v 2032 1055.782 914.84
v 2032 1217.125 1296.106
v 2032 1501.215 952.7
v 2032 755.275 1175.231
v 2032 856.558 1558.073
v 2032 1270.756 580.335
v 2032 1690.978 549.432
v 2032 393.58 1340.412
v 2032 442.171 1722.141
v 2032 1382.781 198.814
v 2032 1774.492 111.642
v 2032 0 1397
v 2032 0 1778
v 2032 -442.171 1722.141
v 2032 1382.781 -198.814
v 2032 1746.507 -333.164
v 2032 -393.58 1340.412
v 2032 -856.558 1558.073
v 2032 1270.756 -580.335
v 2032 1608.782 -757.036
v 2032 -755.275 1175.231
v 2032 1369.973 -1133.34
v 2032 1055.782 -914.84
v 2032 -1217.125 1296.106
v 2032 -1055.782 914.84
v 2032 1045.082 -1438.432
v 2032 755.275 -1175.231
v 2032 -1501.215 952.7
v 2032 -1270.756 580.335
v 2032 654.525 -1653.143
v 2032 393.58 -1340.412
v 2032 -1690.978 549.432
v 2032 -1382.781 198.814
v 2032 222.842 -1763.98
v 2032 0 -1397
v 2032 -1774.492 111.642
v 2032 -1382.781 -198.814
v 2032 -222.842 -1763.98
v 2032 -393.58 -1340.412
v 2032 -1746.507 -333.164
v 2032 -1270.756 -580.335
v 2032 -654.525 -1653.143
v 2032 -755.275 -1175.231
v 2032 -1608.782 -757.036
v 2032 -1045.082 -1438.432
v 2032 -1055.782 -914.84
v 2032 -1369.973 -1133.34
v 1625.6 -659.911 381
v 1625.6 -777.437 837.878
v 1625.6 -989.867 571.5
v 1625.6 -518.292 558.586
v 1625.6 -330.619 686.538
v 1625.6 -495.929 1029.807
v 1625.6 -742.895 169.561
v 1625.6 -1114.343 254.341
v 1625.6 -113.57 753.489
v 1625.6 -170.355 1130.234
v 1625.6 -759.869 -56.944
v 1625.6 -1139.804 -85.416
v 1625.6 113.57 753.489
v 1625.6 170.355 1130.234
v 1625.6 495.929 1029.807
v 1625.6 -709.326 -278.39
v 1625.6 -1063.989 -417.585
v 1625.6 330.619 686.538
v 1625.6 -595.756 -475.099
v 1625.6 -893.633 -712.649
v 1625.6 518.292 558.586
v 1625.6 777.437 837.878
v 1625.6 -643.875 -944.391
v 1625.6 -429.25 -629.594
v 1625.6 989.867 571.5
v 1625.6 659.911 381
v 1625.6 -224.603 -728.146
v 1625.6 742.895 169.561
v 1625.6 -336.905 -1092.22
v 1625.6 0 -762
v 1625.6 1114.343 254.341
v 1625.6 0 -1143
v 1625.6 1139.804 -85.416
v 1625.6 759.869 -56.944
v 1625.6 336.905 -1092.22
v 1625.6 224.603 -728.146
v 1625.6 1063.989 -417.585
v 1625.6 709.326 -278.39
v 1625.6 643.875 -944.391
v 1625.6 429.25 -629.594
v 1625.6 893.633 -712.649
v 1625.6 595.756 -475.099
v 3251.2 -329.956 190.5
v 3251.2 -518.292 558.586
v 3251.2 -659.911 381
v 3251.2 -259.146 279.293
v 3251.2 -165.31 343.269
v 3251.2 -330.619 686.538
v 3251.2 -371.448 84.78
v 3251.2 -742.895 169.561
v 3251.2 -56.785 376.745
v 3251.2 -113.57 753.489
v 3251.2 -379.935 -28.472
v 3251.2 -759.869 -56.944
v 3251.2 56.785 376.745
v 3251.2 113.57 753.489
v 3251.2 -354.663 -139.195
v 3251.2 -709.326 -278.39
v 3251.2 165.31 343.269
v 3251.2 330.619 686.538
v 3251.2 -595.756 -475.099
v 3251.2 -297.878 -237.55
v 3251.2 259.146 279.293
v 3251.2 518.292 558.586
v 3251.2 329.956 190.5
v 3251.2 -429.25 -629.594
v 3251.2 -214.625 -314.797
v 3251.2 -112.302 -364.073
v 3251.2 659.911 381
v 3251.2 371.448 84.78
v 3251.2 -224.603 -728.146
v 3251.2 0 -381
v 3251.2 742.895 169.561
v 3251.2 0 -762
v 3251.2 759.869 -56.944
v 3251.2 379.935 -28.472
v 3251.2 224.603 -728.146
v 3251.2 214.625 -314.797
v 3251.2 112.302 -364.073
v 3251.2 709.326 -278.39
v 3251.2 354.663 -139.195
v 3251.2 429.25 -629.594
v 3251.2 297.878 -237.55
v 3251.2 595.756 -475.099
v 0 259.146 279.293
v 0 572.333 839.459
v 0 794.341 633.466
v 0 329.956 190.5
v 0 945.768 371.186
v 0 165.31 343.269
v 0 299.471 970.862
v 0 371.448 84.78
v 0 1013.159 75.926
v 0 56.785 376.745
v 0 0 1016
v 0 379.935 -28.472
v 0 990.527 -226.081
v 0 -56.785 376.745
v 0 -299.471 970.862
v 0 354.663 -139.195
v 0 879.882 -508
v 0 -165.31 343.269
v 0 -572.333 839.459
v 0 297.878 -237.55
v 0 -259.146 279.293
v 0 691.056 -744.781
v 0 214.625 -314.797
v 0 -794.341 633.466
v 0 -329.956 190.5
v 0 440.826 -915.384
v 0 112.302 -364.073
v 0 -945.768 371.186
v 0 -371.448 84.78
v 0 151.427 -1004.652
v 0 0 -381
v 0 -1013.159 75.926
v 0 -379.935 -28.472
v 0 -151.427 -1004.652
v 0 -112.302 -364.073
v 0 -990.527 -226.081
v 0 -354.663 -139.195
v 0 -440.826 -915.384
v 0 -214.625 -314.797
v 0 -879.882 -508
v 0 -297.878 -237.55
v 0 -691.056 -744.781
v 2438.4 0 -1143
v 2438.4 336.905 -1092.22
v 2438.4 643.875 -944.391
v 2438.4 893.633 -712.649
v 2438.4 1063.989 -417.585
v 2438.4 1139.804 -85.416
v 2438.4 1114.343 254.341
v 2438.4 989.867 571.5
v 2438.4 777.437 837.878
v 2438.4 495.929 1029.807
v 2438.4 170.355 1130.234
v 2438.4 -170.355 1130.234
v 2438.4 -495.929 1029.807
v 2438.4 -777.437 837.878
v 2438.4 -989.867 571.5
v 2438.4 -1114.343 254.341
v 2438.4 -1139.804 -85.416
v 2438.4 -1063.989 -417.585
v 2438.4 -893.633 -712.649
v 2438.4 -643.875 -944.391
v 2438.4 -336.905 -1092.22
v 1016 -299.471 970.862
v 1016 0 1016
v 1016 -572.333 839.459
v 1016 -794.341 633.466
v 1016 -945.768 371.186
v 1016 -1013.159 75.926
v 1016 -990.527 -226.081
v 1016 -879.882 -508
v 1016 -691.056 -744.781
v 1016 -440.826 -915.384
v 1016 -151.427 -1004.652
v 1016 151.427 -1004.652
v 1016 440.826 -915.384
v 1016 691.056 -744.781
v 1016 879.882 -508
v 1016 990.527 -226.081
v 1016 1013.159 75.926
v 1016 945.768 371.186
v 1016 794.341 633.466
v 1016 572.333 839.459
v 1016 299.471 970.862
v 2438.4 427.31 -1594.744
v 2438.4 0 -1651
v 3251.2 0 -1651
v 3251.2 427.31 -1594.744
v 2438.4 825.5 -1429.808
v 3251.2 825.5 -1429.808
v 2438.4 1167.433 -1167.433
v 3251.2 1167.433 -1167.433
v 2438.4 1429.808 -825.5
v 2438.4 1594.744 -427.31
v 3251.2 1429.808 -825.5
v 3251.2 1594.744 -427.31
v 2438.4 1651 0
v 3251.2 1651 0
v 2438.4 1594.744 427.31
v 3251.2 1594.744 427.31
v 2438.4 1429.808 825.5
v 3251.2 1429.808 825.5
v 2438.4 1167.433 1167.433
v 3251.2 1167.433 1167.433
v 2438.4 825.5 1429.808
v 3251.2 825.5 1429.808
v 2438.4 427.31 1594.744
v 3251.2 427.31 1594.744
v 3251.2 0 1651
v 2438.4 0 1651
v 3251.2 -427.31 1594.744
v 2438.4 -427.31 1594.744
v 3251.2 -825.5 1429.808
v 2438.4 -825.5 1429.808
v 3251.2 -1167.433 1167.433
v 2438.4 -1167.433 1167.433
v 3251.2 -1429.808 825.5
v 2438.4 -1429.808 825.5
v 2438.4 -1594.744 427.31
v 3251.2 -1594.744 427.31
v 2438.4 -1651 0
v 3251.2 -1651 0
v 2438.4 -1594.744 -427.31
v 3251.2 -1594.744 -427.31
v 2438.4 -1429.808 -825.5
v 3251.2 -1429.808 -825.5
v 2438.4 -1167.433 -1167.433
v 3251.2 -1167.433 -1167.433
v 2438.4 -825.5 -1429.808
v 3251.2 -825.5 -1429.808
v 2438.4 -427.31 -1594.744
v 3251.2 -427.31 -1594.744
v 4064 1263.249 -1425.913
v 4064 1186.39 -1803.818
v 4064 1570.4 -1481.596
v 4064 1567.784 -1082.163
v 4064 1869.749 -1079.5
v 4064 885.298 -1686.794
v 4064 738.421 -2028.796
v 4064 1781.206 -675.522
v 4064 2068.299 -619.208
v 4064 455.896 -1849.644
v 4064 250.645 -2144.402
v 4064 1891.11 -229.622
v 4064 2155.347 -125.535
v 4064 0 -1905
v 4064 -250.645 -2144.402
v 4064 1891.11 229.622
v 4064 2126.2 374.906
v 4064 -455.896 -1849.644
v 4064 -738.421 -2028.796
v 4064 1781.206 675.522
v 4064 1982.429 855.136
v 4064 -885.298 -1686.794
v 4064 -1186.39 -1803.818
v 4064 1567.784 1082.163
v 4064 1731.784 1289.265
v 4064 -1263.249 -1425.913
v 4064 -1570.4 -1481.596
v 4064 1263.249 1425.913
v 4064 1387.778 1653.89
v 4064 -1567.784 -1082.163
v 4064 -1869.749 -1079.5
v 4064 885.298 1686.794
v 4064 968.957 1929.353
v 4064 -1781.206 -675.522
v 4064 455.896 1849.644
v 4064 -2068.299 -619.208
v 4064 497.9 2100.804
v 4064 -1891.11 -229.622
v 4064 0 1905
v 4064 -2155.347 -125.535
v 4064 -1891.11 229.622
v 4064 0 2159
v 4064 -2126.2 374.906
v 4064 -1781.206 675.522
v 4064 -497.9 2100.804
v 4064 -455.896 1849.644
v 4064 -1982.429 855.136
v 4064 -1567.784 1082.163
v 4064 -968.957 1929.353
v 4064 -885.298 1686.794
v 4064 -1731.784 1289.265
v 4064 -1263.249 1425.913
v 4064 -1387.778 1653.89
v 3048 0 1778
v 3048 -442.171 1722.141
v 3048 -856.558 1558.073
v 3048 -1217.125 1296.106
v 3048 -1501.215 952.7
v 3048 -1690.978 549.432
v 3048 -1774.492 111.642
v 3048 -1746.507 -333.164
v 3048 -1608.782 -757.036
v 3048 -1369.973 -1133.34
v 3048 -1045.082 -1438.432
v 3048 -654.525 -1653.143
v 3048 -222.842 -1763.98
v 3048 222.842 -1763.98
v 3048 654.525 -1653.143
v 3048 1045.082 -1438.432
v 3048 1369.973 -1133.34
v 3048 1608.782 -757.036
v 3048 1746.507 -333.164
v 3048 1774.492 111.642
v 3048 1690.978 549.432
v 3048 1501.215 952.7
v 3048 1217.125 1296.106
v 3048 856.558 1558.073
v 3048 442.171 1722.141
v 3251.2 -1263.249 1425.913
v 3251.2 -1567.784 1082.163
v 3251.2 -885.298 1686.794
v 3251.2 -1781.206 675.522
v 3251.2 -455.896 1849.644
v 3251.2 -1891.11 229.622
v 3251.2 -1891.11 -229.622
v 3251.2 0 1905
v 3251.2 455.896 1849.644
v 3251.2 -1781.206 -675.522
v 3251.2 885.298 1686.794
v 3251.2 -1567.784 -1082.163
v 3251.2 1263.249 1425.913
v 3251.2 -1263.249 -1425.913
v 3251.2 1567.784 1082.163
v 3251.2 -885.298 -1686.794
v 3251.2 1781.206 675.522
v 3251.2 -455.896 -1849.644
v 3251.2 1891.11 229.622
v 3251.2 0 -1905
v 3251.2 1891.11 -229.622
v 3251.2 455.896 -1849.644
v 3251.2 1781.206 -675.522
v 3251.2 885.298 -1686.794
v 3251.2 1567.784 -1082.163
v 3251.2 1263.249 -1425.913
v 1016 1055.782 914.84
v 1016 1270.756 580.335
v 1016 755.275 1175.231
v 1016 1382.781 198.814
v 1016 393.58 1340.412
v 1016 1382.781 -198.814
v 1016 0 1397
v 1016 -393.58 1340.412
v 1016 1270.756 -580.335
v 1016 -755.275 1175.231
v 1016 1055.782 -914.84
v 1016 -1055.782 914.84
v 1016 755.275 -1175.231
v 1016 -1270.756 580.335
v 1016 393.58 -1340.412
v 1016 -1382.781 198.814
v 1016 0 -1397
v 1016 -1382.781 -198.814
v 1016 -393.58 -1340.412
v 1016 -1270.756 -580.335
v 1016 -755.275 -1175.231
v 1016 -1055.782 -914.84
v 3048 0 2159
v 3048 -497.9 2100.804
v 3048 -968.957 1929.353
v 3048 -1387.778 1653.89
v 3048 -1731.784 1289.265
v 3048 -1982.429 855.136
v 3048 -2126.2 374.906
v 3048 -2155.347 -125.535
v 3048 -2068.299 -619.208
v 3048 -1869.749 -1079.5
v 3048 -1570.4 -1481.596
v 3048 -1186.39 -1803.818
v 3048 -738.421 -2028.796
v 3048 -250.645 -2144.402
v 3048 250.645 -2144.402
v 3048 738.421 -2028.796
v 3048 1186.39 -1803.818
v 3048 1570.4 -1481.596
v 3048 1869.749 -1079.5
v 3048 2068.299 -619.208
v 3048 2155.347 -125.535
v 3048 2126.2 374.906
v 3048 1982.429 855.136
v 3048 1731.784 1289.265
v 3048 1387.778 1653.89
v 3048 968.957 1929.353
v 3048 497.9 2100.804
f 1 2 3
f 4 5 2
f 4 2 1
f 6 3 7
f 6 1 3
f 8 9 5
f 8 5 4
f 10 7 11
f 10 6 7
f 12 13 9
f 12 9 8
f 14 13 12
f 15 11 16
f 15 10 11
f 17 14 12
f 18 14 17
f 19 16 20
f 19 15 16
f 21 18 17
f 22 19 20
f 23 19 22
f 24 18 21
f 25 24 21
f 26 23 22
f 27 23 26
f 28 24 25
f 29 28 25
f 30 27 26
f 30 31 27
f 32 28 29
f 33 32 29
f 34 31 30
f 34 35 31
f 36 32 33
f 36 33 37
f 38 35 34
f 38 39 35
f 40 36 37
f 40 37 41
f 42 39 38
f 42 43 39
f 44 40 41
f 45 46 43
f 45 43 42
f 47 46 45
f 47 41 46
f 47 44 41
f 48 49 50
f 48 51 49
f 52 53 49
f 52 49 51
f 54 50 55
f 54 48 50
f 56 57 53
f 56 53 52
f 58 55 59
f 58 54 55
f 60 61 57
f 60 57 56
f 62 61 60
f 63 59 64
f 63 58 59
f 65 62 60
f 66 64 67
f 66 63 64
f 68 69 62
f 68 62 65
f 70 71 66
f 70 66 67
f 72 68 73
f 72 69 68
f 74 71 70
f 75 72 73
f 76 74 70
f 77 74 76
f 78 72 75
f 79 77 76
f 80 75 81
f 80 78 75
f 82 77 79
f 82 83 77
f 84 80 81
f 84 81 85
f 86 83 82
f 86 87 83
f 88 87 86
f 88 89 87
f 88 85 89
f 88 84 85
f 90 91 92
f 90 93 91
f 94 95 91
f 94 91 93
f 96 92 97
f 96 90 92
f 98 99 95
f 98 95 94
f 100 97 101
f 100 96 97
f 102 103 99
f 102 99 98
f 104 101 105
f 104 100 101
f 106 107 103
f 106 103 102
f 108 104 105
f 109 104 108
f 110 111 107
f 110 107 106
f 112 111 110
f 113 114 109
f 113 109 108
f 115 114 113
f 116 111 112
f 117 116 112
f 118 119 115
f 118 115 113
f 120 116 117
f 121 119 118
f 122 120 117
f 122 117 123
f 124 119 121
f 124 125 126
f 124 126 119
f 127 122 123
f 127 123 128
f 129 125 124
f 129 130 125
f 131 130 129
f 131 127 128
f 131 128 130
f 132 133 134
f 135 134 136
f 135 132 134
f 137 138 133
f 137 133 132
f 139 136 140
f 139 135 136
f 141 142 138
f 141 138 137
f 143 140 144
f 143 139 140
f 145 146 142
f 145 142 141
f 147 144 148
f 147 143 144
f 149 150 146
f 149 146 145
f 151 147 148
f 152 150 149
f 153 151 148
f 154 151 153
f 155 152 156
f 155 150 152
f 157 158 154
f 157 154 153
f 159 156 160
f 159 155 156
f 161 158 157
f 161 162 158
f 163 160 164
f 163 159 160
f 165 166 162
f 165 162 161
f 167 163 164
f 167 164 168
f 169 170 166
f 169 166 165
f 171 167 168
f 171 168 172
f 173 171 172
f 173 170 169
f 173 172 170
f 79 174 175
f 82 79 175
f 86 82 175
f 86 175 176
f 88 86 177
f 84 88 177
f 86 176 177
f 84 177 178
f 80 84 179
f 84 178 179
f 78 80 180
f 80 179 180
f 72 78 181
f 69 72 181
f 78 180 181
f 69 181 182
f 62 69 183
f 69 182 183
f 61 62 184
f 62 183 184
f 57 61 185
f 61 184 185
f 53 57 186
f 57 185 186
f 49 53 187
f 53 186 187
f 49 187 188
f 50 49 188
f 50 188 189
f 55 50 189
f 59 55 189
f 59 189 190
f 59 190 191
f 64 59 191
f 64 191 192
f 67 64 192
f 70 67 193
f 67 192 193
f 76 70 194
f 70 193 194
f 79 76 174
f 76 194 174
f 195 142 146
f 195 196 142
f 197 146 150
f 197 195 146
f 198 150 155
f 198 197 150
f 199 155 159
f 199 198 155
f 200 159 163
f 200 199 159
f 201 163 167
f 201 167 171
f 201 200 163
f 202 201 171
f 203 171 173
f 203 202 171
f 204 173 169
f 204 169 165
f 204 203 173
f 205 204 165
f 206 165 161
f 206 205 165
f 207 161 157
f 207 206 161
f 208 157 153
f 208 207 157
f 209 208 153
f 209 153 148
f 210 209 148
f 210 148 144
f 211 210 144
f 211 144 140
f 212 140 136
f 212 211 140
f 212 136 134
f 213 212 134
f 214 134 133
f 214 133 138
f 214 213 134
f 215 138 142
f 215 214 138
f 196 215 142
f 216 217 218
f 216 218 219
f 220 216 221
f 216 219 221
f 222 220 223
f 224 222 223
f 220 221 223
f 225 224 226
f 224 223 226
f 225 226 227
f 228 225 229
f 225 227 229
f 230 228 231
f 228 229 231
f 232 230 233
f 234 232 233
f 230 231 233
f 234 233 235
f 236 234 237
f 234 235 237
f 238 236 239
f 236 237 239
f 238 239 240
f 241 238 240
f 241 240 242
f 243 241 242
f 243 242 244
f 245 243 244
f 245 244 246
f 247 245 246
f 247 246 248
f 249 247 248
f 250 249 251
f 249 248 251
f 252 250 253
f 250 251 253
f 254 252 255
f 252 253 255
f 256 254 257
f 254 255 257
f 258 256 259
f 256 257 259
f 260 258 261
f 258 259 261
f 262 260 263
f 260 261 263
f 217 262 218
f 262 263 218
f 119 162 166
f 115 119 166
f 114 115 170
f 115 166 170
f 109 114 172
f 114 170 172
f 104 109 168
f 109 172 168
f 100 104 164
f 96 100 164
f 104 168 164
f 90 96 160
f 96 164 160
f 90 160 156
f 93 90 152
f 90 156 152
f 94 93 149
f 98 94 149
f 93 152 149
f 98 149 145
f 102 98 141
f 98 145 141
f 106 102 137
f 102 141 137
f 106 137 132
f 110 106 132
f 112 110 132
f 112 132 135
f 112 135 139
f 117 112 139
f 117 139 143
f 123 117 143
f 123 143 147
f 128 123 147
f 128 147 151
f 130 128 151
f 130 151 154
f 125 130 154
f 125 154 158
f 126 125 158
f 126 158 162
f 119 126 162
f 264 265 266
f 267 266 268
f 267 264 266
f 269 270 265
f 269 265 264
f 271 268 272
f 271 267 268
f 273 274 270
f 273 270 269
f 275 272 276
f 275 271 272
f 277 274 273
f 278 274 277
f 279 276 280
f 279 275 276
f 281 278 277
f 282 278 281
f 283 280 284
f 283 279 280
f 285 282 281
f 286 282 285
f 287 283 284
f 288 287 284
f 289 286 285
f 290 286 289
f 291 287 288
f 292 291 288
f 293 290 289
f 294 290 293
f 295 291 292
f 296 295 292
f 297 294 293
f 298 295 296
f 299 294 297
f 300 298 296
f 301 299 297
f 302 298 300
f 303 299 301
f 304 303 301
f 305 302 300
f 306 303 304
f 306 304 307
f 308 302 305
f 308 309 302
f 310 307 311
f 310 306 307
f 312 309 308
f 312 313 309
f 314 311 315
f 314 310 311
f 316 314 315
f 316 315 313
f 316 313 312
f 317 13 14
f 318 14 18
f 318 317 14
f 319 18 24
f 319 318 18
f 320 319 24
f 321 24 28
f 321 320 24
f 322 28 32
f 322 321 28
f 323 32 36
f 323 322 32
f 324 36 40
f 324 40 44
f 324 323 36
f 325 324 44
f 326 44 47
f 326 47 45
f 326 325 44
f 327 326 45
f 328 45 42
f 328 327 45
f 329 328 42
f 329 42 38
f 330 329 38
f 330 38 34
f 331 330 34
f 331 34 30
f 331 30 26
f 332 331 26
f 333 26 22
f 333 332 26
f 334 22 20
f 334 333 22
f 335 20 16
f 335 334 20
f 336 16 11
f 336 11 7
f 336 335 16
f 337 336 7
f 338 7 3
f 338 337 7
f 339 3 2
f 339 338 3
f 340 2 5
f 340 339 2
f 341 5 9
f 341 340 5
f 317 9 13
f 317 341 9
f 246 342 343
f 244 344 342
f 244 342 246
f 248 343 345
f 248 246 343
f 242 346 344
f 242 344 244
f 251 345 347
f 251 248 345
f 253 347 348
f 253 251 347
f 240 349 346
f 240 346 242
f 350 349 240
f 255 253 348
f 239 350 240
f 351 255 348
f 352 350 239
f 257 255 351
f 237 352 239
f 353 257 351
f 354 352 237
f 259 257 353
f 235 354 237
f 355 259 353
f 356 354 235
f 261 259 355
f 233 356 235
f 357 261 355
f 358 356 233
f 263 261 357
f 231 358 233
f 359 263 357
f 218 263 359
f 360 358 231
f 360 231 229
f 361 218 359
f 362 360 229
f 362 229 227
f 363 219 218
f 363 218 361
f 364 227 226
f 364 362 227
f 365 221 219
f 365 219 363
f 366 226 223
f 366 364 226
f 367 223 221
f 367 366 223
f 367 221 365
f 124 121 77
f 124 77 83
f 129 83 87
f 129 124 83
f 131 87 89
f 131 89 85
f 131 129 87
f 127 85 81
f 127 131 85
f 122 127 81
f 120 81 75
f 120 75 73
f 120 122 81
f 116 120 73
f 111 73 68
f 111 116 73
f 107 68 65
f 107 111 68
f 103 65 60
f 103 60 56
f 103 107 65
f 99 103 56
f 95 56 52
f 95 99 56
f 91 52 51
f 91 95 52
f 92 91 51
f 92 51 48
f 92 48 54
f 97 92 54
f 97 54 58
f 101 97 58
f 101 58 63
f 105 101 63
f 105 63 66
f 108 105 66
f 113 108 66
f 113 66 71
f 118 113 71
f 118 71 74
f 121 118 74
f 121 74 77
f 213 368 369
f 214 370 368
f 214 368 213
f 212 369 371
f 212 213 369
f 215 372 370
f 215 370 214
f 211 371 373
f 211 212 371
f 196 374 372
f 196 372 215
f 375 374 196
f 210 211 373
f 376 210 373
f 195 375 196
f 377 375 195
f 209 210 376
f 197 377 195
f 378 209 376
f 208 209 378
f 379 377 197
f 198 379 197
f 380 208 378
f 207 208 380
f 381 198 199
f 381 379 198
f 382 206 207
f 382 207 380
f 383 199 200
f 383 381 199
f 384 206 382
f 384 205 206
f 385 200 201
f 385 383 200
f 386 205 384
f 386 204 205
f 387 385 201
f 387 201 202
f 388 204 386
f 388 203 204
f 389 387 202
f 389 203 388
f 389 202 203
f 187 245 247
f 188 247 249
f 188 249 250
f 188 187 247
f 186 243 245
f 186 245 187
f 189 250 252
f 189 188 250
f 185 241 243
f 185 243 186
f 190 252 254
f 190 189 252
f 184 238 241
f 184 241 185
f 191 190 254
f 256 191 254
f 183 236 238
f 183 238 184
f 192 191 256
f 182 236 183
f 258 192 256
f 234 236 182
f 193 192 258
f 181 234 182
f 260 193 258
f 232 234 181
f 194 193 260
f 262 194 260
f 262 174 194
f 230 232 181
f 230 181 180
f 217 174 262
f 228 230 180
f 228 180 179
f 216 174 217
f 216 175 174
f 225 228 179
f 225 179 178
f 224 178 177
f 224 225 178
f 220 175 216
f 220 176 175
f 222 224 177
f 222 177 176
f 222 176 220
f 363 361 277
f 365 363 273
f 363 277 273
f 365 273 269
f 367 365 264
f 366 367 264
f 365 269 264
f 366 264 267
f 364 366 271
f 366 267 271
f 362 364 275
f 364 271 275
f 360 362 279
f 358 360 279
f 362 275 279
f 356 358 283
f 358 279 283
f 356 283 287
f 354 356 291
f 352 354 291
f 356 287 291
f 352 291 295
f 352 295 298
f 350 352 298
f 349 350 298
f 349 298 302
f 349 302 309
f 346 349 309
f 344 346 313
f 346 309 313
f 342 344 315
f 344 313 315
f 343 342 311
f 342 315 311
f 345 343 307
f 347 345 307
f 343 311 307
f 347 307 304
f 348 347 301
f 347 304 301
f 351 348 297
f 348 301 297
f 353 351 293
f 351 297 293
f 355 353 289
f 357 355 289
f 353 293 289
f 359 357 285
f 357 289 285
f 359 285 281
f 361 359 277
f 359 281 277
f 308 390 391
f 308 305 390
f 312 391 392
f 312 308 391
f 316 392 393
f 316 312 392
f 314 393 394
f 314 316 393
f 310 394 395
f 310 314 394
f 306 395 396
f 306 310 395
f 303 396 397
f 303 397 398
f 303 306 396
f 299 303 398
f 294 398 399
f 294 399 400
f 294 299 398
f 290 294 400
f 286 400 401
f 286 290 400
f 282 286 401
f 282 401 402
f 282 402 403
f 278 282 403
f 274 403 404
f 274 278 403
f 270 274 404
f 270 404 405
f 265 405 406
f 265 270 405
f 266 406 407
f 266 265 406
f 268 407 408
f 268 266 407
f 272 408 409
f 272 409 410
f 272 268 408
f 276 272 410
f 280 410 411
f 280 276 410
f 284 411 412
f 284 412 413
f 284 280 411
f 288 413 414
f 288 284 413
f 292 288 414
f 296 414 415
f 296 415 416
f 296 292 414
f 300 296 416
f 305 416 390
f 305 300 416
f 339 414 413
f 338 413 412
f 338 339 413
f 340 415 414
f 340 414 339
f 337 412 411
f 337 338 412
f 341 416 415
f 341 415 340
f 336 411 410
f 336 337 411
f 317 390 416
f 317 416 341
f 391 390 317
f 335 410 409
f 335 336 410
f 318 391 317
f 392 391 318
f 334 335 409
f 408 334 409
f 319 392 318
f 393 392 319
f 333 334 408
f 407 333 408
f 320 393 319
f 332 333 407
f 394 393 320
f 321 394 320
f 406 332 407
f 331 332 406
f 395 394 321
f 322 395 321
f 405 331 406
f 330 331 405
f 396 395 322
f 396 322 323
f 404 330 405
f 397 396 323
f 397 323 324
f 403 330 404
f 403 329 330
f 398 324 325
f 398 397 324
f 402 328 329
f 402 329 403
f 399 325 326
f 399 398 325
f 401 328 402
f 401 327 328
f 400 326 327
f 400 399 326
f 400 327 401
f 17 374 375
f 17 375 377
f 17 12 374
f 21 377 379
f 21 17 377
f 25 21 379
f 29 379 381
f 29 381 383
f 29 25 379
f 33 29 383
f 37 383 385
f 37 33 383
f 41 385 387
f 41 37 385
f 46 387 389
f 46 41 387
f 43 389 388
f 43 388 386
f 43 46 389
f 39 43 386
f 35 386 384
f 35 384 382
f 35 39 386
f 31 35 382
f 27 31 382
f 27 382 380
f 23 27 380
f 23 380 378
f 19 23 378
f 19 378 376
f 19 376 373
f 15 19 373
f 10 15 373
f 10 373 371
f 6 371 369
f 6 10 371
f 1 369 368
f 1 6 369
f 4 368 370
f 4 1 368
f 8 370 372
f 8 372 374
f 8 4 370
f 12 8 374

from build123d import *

# Parameters (mm, degrees)
SKETCH5_R                      = 1905
CUT_EXTRUDE2_DEPTH             = 812.8
SKETCH6_R                      = 1651
CUT_EXTRUDE3_DEPTH             = 812.8
SKETCH8_R                      = 1143
CUT_EXTRUDE5_DEPTH             = 812.8
SKETCH11_R                     = 762
BOSS_EXTRUDE2_DEPTH            = 3251.2
CUT_EXTRUDE7_REACH             = 5085.174
SKETCH12_R                     = 381
CUT_EXTRUDE7_DIRECTION_2_DEPTH = 5084.174008432


with BuildPart() as part:
    # Sketch1 → Revolve1 (revolve)
    with BuildSketch(Plane.XY, mode=Mode.PRIVATE) as revolve1_sk:
        Polygon((0, 381), (0, 1016), (1016, 1016), (1016, 1397), (2032, 1397), (2032, 1778), (3048, 1778), (3048, 2159), (4064, 2159), (4064, 381), align=None)
    revolve(revolve1_sk.sketch.rotate(Axis((0, 0, 0), (1, 0, 0)), 90), axis=Axis((0, 0, 0), (1, 0, 0)))

    # Sketch5 → Cut-Extrude2 (cut)
    with BuildSketch(Plane(origin=(4064, 0, 0), x_dir=(0, 0, -1), z_dir=(1, 0, 0))):
        Circle(SKETCH5_R)
    extrude(amount=-CUT_EXTRUDE2_DEPTH, mode=Mode.SUBTRACT)

    # Sketch6 → Cut-Extrude3 (cut)
    with BuildSketch(Plane(origin=(3251.2, 0, 0), x_dir=(0, 0, -1), z_dir=(1, 0, 0))):
        Circle(SKETCH6_R)
    extrude(amount=-CUT_EXTRUDE3_DEPTH, mode=Mode.SUBTRACT)

    # Sketch8 → Cut-Extrude5 (cut)
    with BuildSketch(Plane(origin=(2438.4, 0, 0), x_dir=(0, 0, -1), z_dir=(1, 0, 0))):
        Circle(SKETCH8_R)
    extrude(amount=-CUT_EXTRUDE5_DEPTH, mode=Mode.SUBTRACT)

    # Sketch11 → Boss-Extrude2 (add, through all)
    with BuildSketch(Plane(origin=(3251.2, 0, 0), x_dir=(0, 0, -1), z_dir=(1, 0, 0))):
        Circle(SKETCH11_R)
    extrude(amount=-BOSS_EXTRUDE2_DEPTH)

    # Sketch12 → Cut-Extrude7 (cut, up to next)
    with BuildSketch(Plane.ZY, mode=Mode.PRIVATE) as cut_extrude7_sk1:
        with Locations(Location((0, 0, 0), (0, 0, 180))):
            Circle(SKETCH12_R)
    cut_extrude7_tool1 = extrude(cut_extrude7_sk1.sketch, amount=-CUT_EXTRUDE7_REACH, mode=Mode.PRIVATE) & part.part
    add(cut_extrude7_tool1.solids().sort_by_distance((0, 0, 0))[0], mode=Mode.SUBTRACT)

    # Sketch12 → Cut-Extrude7 direction 2 (cut)
    with BuildSketch(Plane.ZY):
        with Locations(Location((0, 0, 0), (0, 0, 180))):
            Circle(SKETCH12_R)
    extrude(amount=CUT_EXTRUDE7_DIRECTION_2_DEPTH, mode=Mode.SUBTRACT)


solid = part.part
